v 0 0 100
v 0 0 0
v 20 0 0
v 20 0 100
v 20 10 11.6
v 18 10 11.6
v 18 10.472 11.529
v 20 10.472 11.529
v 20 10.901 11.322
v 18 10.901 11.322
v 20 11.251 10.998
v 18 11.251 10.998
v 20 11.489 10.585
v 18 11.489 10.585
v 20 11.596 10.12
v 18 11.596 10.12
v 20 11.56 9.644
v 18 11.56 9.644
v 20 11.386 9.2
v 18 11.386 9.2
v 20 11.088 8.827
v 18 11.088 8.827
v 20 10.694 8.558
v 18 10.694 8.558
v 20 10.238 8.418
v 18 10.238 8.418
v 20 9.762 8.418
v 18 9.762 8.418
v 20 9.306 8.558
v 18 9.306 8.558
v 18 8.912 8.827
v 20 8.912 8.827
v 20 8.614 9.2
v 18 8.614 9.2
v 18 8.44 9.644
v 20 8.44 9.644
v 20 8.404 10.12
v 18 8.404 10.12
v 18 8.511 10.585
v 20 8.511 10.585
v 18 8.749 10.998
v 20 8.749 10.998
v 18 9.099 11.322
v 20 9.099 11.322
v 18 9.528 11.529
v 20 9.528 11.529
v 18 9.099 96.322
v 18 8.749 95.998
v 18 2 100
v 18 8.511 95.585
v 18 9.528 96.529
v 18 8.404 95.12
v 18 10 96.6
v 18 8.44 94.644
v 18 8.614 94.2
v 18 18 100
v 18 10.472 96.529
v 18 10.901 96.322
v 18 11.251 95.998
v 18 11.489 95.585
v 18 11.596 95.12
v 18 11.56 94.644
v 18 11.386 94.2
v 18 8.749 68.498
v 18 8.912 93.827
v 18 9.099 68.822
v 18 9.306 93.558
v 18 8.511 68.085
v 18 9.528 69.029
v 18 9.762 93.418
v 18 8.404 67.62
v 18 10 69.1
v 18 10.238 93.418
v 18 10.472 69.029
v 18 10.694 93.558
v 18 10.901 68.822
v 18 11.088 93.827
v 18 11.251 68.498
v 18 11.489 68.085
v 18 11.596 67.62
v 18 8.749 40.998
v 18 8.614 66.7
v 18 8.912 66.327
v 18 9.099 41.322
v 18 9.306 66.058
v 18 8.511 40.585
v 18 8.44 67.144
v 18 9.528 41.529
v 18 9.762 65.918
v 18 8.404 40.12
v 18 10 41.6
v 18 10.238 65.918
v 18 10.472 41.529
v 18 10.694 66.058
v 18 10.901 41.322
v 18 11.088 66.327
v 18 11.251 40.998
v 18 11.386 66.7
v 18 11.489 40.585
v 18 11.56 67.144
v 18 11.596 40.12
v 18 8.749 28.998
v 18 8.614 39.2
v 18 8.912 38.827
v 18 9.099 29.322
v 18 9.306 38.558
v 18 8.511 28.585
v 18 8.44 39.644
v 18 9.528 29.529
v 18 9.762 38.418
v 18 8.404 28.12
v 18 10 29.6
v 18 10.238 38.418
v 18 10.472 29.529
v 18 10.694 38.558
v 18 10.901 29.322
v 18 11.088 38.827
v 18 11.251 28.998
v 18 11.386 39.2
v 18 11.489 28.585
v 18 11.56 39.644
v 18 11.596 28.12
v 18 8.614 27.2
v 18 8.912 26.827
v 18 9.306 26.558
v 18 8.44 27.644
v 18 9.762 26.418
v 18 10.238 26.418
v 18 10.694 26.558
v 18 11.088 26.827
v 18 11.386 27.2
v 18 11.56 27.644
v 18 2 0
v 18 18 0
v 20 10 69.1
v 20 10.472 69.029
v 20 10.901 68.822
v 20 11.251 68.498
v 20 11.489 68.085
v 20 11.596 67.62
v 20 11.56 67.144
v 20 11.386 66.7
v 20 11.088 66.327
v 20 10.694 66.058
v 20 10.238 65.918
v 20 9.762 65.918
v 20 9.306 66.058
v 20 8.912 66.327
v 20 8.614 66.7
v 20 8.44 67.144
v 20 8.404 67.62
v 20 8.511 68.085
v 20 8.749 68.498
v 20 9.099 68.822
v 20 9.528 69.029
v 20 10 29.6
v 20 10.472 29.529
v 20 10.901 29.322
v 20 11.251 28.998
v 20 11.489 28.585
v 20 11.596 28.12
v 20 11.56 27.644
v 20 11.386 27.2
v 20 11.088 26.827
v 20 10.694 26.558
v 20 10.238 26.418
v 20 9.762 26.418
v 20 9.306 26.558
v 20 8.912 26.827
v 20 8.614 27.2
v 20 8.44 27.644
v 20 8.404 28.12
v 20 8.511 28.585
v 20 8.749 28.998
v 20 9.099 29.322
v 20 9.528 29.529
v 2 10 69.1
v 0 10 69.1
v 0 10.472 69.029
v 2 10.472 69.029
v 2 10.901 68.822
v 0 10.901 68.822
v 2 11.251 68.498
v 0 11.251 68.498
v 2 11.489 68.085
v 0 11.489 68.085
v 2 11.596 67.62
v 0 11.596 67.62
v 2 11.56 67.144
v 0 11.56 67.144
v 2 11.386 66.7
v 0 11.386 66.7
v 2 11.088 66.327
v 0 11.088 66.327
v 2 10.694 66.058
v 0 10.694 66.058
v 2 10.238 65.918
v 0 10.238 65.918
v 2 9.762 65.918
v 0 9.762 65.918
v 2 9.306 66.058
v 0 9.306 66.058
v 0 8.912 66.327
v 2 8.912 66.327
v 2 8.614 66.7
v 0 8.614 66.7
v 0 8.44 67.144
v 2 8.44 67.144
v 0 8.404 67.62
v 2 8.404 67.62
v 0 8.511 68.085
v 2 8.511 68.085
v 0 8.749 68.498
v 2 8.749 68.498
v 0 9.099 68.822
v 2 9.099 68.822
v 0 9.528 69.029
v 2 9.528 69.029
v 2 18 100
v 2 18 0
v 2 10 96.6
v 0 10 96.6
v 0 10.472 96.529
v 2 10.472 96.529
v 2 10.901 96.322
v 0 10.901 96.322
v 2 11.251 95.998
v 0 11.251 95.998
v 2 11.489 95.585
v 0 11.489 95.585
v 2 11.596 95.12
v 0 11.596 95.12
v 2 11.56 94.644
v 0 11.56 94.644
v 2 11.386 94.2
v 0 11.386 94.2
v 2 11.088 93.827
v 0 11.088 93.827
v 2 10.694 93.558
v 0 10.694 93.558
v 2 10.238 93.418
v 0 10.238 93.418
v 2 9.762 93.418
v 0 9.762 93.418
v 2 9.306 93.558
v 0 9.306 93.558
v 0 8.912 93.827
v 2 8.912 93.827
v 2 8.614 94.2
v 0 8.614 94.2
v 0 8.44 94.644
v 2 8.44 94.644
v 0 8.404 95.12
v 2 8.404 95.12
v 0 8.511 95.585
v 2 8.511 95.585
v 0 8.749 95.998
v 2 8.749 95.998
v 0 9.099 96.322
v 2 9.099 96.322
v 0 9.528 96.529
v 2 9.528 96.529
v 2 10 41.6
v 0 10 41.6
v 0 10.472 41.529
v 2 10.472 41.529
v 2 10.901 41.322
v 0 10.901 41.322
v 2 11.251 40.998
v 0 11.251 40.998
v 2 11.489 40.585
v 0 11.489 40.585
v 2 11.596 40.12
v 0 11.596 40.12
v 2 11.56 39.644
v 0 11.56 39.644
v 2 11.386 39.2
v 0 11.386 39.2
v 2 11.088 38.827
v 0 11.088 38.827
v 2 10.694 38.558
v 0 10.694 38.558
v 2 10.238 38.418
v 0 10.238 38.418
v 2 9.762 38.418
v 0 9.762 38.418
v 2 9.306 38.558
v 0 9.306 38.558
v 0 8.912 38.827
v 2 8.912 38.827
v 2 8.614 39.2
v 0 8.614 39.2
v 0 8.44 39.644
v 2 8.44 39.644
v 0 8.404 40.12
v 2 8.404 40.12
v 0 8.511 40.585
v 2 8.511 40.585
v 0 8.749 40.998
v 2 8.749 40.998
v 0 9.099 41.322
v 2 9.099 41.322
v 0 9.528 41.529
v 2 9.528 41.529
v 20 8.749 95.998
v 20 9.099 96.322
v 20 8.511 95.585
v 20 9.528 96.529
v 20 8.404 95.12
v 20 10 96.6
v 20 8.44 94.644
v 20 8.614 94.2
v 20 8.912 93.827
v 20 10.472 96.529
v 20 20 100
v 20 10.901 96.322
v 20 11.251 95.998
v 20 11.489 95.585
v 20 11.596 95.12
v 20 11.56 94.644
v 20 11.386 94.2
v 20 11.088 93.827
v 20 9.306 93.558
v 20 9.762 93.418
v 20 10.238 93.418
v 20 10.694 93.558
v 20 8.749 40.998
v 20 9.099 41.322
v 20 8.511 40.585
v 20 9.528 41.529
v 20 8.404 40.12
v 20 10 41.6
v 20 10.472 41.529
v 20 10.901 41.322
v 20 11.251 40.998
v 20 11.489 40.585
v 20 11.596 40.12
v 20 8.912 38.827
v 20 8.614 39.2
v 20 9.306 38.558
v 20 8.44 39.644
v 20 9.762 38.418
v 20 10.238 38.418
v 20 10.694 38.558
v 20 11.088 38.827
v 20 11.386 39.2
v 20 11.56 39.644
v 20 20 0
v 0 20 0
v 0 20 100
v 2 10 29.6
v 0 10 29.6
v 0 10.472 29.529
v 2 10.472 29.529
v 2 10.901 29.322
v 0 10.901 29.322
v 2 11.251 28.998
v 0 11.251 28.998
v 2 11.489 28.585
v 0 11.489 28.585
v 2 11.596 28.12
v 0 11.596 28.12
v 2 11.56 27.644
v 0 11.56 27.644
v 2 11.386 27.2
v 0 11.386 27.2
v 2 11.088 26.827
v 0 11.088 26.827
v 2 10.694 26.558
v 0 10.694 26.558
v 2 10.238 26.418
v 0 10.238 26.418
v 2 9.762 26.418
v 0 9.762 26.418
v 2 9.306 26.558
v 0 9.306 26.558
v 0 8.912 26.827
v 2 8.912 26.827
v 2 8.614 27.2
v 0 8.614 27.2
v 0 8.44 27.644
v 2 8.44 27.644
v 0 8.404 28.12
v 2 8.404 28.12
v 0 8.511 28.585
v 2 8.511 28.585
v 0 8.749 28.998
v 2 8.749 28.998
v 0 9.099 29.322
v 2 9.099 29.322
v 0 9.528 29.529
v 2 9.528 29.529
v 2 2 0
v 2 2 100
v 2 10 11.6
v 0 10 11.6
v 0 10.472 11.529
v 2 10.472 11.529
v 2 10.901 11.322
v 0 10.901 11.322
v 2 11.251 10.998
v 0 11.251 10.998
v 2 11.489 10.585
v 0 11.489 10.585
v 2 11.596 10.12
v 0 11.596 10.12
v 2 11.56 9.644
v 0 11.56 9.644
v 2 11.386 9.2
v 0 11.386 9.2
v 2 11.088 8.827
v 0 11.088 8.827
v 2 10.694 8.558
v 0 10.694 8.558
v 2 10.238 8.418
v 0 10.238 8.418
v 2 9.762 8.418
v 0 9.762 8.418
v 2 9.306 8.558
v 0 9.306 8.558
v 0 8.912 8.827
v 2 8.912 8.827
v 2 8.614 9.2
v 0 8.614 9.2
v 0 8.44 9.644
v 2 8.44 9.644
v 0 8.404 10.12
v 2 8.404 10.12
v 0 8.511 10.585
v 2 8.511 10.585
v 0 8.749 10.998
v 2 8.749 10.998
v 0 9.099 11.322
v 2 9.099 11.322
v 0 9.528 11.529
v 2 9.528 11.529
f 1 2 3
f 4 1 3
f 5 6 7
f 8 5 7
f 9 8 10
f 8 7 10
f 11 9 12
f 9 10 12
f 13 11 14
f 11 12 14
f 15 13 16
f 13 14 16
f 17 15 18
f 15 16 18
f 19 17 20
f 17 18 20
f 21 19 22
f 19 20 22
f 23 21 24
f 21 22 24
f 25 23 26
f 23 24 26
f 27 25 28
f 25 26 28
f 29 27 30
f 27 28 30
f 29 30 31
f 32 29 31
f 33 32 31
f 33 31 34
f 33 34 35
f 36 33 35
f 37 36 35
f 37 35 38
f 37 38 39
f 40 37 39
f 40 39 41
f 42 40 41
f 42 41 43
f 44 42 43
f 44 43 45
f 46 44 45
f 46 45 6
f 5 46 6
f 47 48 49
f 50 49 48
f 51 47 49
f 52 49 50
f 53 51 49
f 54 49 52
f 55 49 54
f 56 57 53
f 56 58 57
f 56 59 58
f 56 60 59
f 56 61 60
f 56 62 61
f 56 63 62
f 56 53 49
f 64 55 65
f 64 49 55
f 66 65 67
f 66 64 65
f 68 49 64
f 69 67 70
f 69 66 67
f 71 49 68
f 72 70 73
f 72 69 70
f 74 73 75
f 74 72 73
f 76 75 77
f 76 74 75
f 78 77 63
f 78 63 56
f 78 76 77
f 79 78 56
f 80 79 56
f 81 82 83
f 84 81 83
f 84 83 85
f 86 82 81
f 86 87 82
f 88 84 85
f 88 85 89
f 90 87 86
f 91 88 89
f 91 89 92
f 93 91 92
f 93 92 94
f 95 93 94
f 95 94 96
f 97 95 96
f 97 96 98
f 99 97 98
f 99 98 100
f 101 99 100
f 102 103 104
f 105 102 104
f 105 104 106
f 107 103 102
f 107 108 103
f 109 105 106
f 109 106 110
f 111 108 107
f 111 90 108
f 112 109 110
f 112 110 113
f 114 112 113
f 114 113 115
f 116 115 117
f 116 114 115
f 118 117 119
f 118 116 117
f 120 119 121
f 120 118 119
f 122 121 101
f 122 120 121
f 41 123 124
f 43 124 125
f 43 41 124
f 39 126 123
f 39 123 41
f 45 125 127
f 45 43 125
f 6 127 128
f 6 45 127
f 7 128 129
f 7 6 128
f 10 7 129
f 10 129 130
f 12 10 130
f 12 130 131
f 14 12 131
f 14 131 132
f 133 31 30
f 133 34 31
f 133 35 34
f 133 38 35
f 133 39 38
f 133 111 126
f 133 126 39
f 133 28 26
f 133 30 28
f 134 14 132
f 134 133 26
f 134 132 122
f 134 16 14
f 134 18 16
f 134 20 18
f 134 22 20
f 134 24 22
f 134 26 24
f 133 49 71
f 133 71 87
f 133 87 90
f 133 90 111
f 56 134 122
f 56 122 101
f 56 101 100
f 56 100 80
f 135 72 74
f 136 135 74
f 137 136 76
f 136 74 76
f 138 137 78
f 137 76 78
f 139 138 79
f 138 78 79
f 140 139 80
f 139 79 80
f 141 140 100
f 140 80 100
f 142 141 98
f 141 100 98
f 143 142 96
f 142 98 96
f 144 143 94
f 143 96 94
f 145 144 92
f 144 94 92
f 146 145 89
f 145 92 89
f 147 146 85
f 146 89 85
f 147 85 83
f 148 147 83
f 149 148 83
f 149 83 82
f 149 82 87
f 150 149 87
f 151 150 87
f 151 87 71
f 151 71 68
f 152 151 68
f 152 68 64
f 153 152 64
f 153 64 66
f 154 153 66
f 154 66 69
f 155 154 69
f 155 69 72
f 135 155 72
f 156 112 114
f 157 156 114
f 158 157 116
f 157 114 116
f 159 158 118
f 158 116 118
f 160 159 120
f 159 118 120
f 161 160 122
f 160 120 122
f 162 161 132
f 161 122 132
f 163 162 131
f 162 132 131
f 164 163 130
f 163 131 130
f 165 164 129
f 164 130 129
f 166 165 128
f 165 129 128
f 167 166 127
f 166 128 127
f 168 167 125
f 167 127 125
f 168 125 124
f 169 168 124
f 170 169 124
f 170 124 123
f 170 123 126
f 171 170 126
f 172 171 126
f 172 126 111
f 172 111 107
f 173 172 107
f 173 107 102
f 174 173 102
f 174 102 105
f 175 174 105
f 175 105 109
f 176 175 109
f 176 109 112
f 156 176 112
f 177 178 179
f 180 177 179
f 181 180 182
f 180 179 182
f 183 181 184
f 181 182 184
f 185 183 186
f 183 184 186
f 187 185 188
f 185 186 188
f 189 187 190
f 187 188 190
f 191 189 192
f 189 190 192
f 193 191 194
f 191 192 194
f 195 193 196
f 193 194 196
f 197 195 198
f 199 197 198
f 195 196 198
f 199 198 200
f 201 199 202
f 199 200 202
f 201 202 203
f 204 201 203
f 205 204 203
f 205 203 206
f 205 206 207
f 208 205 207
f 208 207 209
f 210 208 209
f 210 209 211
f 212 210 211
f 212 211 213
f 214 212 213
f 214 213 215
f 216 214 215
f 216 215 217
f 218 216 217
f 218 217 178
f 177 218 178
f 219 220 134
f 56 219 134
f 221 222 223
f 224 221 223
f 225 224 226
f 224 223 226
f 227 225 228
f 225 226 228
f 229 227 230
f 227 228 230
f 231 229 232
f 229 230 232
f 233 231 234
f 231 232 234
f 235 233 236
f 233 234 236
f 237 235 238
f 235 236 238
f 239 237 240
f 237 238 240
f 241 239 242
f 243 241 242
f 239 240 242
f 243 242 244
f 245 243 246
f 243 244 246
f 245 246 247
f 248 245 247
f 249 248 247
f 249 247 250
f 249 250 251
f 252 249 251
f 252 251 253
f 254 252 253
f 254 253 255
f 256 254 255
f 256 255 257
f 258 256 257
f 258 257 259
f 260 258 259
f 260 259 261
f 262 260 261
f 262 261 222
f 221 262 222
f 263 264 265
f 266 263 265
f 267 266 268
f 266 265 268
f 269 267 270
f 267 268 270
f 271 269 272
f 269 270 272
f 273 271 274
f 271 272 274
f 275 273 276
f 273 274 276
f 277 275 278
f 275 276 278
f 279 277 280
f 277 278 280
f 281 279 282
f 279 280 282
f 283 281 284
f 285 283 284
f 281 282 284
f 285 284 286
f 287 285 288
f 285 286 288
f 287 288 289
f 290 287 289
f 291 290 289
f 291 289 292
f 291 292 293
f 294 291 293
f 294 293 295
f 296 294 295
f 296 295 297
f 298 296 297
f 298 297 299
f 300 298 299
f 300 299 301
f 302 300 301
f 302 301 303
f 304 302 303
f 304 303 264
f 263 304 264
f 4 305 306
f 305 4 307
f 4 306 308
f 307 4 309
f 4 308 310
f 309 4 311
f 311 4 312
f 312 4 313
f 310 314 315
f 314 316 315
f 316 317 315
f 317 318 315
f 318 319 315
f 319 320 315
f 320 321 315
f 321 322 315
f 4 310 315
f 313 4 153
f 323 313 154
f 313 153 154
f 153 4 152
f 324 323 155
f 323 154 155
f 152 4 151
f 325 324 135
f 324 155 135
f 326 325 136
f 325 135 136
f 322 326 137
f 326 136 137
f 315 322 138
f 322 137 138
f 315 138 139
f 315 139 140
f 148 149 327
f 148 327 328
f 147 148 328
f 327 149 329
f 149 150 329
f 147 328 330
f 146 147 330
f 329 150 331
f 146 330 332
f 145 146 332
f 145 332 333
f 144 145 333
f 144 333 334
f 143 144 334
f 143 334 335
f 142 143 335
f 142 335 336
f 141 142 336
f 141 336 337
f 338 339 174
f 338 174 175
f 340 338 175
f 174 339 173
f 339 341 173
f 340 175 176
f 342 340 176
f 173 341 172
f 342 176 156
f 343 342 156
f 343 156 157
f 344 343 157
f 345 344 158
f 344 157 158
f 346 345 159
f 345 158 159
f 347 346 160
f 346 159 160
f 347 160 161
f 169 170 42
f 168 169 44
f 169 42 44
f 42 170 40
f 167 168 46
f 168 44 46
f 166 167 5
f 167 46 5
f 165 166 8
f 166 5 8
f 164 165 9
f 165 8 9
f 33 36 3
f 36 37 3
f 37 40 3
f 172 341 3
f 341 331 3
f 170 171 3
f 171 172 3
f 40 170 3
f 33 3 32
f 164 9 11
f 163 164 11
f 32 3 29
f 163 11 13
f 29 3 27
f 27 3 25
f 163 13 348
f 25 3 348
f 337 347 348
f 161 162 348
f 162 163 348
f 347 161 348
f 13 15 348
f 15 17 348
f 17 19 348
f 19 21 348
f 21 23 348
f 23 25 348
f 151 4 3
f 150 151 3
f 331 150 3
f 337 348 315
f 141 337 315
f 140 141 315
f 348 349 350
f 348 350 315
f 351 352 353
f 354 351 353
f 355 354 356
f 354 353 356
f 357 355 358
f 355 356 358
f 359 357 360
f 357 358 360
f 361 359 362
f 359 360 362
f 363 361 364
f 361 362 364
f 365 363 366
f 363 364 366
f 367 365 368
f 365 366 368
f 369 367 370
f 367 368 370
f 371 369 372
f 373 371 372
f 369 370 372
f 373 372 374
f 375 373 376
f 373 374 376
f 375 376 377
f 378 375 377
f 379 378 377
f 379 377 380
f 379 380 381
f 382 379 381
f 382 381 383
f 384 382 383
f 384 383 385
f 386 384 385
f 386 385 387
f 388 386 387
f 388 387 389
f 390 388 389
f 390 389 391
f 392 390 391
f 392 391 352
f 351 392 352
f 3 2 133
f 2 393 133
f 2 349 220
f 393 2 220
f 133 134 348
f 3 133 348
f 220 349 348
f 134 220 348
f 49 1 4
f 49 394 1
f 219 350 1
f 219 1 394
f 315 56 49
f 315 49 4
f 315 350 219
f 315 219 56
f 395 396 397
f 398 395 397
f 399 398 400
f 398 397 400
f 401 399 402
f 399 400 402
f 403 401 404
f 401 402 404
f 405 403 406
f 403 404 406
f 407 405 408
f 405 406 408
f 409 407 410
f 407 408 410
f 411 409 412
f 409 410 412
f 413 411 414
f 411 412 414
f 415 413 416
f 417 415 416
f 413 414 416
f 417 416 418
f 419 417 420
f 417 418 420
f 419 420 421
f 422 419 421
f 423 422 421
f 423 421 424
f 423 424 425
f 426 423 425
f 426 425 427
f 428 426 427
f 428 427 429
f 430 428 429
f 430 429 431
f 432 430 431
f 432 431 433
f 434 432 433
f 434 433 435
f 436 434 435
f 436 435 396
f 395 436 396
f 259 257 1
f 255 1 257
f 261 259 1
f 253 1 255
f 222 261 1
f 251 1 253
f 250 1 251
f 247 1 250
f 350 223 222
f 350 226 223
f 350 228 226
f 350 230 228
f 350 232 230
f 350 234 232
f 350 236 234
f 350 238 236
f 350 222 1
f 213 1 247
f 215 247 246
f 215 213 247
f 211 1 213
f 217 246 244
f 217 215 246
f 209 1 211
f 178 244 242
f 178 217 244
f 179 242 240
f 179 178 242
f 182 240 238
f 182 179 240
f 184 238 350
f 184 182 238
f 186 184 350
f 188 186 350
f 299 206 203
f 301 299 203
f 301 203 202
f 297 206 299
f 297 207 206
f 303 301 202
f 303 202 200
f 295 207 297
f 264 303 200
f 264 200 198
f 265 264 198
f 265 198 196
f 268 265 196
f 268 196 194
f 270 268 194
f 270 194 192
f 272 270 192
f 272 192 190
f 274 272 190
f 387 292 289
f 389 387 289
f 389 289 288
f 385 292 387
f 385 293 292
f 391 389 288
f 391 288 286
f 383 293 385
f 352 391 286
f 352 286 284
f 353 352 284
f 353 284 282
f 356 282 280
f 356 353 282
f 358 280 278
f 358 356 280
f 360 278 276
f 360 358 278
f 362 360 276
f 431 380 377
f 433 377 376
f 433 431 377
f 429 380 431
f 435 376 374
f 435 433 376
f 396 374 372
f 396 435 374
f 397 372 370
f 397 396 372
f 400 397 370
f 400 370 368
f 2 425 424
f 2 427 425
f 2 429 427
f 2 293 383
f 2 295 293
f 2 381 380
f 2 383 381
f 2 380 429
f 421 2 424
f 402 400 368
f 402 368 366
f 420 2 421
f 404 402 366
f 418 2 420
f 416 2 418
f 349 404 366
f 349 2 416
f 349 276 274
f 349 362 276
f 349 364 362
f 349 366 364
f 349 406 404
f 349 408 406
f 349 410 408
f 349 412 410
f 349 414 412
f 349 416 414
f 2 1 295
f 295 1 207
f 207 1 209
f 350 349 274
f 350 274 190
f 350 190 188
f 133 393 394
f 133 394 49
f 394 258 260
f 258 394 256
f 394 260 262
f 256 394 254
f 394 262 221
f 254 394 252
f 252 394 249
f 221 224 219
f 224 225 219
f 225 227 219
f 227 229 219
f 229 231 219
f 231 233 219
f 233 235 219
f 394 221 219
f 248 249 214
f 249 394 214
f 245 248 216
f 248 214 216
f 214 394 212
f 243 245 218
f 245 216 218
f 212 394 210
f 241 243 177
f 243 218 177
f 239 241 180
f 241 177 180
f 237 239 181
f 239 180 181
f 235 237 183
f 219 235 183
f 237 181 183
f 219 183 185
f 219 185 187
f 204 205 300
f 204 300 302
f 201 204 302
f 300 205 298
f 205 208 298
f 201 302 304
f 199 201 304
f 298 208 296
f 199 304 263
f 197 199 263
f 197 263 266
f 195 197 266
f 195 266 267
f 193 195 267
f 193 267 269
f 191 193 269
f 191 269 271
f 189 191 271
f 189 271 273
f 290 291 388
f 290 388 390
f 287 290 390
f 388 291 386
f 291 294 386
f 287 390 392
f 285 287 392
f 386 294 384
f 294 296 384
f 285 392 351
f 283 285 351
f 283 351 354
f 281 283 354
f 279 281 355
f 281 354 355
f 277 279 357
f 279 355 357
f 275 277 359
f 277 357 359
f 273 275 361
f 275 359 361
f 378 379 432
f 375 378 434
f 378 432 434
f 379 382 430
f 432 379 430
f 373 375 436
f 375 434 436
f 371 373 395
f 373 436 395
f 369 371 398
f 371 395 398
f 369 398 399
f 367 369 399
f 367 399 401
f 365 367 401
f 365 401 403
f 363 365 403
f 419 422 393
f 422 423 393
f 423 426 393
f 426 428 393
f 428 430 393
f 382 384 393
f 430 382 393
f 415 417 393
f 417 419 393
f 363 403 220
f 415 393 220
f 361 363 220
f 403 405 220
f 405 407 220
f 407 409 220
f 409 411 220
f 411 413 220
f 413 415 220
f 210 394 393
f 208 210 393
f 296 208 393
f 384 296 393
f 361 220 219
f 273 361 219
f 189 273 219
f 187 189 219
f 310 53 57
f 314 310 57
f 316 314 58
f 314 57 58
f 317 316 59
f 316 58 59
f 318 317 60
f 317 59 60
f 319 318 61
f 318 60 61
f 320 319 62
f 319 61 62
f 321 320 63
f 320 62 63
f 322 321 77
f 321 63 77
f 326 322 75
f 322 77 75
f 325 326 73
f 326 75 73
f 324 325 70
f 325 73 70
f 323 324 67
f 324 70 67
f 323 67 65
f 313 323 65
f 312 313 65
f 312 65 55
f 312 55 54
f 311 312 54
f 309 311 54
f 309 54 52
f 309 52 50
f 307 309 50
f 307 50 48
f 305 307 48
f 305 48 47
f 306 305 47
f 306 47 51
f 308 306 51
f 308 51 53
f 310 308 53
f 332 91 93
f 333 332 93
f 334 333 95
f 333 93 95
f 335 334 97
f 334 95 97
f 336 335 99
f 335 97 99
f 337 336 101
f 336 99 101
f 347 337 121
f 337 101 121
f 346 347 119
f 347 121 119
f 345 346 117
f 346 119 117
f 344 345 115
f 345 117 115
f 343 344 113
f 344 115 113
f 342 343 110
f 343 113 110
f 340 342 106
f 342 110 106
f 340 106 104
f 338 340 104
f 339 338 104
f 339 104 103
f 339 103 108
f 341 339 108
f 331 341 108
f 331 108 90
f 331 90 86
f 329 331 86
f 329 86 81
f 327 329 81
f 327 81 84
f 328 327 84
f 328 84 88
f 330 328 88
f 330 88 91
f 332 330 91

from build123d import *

# Parameters (mm, degrees)
SKETCH_1_W          = 20
SKETCH_1_H          = 20
SKETCH_1_W_2        = 16
SKETCH_1_H_2        = 16
EXTRUDE_1_DEPTH     = 100
SKETCH_2_R          = 1.6
CUT_EXTRUDE_1_DEPTH = 104.923048454
SKETCH_3_R          = 1.6
CUT_EXTRUDE_2_DEPTH = 104.923048454


with BuildPart() as part:
    # 草图1 → 拉伸-薄壁1 (new body)
    with BuildSketch(Plane.XY):
        with Locations((10, 10)):
            Rectangle(SKETCH_1_W, SKETCH_1_H)
        with Locations((10, 10)):
            Rectangle(SKETCH_1_W_2, SKETCH_1_H_2, mode=Mode.SUBTRACT)
    extrude(amount=EXTRUDE_1_DEPTH)

    # 草图2 → 切除-拉伸1 (cut, through all)
    with BuildSketch(Plane.ZY):
        with Locations((10, 10)):
            Circle(SKETCH_2_R)
        with Locations((28, 10)):
            Circle(SKETCH_2_R)
    extrude(amount=-CUT_EXTRUDE_1_DEPTH, mode=Mode.SUBTRACT)

    # 草图3 → 切除-拉伸2 (cut, through all)
    with BuildSketch(Plane.ZY):
        with Locations((67.5, 10)):
            Circle(SKETCH_3_R)
        with Locations((40, 10)):
            Circle(SKETCH_3_R)
        with Locations((95, 10)):
            Circle(SKETCH_3_R)
    extrude(amount=-CUT_EXTRUDE_2_DEPTH, mode=Mode.SUBTRACT)


solid = part.part
